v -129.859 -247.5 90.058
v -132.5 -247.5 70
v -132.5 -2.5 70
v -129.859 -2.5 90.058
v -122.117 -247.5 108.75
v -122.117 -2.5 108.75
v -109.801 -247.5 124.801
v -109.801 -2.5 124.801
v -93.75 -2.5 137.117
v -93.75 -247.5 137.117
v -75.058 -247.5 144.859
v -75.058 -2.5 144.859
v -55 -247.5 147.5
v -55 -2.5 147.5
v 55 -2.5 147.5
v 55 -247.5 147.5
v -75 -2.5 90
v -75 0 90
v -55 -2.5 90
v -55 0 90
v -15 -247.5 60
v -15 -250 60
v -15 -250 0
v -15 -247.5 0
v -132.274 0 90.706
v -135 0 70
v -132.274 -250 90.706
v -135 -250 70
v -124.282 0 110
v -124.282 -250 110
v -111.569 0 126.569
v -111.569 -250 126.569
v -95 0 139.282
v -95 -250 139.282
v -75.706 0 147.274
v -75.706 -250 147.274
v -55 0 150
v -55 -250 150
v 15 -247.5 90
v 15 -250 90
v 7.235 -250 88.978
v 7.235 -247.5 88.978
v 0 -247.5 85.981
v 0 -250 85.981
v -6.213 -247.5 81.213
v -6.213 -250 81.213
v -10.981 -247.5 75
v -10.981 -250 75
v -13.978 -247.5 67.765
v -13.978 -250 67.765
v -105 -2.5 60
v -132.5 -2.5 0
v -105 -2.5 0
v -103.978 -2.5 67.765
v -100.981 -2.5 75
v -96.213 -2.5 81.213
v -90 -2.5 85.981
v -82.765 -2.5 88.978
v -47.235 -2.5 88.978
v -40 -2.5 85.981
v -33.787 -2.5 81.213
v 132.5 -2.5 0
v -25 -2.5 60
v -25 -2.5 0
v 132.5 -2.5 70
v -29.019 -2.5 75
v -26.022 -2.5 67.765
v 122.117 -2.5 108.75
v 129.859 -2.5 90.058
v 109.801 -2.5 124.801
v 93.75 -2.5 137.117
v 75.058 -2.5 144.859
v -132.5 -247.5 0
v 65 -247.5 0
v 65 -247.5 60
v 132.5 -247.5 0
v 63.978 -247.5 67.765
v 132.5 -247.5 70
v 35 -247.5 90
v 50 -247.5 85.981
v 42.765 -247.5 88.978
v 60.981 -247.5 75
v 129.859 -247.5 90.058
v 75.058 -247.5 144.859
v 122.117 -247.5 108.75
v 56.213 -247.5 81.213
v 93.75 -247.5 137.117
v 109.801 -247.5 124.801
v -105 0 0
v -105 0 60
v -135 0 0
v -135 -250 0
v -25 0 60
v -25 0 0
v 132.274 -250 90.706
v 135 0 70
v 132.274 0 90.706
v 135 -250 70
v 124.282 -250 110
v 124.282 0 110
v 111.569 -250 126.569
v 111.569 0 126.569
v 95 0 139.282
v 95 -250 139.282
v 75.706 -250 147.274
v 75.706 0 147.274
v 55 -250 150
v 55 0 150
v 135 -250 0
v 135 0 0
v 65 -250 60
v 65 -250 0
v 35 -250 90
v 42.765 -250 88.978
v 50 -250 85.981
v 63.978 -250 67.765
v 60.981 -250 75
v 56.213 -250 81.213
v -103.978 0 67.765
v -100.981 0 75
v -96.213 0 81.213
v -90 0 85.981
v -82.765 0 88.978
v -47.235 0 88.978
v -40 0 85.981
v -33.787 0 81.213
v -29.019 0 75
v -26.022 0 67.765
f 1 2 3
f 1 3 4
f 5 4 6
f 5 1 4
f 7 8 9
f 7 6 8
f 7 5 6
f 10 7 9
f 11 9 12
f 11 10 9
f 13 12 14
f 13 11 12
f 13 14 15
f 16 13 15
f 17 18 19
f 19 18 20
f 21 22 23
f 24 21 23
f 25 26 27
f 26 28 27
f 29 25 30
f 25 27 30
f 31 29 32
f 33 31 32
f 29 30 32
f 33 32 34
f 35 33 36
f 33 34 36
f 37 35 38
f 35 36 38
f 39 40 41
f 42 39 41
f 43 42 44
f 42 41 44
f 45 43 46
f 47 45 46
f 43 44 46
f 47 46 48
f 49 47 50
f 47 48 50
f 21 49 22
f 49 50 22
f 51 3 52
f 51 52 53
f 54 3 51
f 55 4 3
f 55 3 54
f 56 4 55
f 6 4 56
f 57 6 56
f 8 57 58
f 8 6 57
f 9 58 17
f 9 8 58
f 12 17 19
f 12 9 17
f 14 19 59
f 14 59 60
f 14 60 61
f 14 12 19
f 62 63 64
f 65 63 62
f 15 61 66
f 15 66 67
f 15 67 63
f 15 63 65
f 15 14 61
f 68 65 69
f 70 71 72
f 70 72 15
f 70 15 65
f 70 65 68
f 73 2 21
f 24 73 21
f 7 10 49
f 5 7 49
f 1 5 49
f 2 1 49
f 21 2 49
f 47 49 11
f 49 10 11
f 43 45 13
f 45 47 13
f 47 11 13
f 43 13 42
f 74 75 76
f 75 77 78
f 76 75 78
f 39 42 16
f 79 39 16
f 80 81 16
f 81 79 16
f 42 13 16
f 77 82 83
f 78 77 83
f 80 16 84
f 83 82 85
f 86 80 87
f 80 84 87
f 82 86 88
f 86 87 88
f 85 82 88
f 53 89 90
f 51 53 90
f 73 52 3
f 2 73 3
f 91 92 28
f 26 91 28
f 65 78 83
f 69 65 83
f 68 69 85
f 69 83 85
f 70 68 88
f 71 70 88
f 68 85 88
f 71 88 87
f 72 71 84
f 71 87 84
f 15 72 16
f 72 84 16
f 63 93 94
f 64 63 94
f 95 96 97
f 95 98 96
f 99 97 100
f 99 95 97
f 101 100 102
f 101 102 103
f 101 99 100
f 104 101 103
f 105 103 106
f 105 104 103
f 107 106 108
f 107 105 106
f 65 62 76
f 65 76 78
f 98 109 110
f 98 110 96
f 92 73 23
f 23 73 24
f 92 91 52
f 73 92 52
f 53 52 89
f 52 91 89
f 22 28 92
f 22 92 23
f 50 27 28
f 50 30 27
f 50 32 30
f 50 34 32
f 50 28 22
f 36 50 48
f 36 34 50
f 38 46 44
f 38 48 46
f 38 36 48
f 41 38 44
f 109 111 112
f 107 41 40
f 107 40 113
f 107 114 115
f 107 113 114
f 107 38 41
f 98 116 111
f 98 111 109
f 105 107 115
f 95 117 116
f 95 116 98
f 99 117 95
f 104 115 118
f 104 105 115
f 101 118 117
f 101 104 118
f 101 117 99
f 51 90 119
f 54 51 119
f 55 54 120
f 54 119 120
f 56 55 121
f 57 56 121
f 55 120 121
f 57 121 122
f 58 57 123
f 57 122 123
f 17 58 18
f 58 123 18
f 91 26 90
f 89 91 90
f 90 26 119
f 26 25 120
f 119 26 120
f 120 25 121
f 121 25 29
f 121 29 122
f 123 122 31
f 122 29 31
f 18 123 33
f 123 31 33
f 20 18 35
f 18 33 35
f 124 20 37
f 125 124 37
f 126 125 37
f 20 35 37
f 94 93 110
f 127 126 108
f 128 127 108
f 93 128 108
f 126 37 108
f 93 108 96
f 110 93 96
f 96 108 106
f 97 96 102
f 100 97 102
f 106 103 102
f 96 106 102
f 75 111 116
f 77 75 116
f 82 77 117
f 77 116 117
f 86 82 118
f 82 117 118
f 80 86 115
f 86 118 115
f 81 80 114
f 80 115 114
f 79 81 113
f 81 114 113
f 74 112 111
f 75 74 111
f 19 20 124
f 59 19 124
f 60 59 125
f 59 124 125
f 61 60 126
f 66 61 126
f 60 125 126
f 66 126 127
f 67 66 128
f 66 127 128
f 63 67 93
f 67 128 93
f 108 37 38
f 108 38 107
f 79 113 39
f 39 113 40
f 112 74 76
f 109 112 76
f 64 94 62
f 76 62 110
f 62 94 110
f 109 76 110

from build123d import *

# Parameters (mm, degrees)
F0_W     = 270
F0_H     = 150
F1_DEPTH = 250
F2_R     = 80
F3_T     = -2.5
F5_DEPTH = 2.5
F7_DEPTH = 25


with BuildPart() as f1:
    # F0 (on Front) → F1 (new body)
    with BuildSketch(Plane.XZ):
        with Locations((0, 75)):
            Rectangle(F0_W, F0_H)
    extrude(amount=F1_DEPTH)

    # F2
    f2_edges = [f1.edges().sort_by_distance(p)[0] for p in [
        (-135, -125, 150),
        (135, -125, 150),
    ]]
    fillet(f2_edges, radius=F2_R)

    # F3
    f3_openings = [f1.faces().sort_by_distance(p)[0] for p in [
        (0, -125, 0),
    ]]
    offset(amount=F3_T, openings=f3_openings)

    # F4 (on face) → F5 (cut, through all)
    with BuildSketch(Plane.XZ.offset(250)):
        with BuildLine():
            Line((-15, 60), (-15, 0))
            Line((-15, 0), (65, 0))
            Line((65, 0), (65, 60))
            ThreePointArc((65, 60), (56.213203, 81.213203), (35, 90))
            Line((35, 90), (15, 90))
            ThreePointArc((15, 90), (-6.213203, 81.213203), (-15, 60))
        make_face()
    extrude(amount=-F5_DEPTH, mode=Mode.SUBTRACT)

    # F6 (on face) → F7 (cut)
    with BuildSketch(Plane(origin=(0, 0, 0), x_dir=(-1, 0, 0), z_dir=(0, 1, 0))):
        with BuildLine():
            Line((25, 60), (25, 0))
            Line((25, 0), (105, 0))
            Line((105, 0), (105, 60))
            ThreePointArc((105, 60), (96.213203, 81.213203), (75, 90))
            Line((75, 90), (55, 90))
            ThreePointArc((55, 90), (33.786797, 81.213203), (25, 60))
        make_face()
    extrude(amount=-F7_DEPTH, mode=Mode.SUBTRACT)


solid = f1.part
